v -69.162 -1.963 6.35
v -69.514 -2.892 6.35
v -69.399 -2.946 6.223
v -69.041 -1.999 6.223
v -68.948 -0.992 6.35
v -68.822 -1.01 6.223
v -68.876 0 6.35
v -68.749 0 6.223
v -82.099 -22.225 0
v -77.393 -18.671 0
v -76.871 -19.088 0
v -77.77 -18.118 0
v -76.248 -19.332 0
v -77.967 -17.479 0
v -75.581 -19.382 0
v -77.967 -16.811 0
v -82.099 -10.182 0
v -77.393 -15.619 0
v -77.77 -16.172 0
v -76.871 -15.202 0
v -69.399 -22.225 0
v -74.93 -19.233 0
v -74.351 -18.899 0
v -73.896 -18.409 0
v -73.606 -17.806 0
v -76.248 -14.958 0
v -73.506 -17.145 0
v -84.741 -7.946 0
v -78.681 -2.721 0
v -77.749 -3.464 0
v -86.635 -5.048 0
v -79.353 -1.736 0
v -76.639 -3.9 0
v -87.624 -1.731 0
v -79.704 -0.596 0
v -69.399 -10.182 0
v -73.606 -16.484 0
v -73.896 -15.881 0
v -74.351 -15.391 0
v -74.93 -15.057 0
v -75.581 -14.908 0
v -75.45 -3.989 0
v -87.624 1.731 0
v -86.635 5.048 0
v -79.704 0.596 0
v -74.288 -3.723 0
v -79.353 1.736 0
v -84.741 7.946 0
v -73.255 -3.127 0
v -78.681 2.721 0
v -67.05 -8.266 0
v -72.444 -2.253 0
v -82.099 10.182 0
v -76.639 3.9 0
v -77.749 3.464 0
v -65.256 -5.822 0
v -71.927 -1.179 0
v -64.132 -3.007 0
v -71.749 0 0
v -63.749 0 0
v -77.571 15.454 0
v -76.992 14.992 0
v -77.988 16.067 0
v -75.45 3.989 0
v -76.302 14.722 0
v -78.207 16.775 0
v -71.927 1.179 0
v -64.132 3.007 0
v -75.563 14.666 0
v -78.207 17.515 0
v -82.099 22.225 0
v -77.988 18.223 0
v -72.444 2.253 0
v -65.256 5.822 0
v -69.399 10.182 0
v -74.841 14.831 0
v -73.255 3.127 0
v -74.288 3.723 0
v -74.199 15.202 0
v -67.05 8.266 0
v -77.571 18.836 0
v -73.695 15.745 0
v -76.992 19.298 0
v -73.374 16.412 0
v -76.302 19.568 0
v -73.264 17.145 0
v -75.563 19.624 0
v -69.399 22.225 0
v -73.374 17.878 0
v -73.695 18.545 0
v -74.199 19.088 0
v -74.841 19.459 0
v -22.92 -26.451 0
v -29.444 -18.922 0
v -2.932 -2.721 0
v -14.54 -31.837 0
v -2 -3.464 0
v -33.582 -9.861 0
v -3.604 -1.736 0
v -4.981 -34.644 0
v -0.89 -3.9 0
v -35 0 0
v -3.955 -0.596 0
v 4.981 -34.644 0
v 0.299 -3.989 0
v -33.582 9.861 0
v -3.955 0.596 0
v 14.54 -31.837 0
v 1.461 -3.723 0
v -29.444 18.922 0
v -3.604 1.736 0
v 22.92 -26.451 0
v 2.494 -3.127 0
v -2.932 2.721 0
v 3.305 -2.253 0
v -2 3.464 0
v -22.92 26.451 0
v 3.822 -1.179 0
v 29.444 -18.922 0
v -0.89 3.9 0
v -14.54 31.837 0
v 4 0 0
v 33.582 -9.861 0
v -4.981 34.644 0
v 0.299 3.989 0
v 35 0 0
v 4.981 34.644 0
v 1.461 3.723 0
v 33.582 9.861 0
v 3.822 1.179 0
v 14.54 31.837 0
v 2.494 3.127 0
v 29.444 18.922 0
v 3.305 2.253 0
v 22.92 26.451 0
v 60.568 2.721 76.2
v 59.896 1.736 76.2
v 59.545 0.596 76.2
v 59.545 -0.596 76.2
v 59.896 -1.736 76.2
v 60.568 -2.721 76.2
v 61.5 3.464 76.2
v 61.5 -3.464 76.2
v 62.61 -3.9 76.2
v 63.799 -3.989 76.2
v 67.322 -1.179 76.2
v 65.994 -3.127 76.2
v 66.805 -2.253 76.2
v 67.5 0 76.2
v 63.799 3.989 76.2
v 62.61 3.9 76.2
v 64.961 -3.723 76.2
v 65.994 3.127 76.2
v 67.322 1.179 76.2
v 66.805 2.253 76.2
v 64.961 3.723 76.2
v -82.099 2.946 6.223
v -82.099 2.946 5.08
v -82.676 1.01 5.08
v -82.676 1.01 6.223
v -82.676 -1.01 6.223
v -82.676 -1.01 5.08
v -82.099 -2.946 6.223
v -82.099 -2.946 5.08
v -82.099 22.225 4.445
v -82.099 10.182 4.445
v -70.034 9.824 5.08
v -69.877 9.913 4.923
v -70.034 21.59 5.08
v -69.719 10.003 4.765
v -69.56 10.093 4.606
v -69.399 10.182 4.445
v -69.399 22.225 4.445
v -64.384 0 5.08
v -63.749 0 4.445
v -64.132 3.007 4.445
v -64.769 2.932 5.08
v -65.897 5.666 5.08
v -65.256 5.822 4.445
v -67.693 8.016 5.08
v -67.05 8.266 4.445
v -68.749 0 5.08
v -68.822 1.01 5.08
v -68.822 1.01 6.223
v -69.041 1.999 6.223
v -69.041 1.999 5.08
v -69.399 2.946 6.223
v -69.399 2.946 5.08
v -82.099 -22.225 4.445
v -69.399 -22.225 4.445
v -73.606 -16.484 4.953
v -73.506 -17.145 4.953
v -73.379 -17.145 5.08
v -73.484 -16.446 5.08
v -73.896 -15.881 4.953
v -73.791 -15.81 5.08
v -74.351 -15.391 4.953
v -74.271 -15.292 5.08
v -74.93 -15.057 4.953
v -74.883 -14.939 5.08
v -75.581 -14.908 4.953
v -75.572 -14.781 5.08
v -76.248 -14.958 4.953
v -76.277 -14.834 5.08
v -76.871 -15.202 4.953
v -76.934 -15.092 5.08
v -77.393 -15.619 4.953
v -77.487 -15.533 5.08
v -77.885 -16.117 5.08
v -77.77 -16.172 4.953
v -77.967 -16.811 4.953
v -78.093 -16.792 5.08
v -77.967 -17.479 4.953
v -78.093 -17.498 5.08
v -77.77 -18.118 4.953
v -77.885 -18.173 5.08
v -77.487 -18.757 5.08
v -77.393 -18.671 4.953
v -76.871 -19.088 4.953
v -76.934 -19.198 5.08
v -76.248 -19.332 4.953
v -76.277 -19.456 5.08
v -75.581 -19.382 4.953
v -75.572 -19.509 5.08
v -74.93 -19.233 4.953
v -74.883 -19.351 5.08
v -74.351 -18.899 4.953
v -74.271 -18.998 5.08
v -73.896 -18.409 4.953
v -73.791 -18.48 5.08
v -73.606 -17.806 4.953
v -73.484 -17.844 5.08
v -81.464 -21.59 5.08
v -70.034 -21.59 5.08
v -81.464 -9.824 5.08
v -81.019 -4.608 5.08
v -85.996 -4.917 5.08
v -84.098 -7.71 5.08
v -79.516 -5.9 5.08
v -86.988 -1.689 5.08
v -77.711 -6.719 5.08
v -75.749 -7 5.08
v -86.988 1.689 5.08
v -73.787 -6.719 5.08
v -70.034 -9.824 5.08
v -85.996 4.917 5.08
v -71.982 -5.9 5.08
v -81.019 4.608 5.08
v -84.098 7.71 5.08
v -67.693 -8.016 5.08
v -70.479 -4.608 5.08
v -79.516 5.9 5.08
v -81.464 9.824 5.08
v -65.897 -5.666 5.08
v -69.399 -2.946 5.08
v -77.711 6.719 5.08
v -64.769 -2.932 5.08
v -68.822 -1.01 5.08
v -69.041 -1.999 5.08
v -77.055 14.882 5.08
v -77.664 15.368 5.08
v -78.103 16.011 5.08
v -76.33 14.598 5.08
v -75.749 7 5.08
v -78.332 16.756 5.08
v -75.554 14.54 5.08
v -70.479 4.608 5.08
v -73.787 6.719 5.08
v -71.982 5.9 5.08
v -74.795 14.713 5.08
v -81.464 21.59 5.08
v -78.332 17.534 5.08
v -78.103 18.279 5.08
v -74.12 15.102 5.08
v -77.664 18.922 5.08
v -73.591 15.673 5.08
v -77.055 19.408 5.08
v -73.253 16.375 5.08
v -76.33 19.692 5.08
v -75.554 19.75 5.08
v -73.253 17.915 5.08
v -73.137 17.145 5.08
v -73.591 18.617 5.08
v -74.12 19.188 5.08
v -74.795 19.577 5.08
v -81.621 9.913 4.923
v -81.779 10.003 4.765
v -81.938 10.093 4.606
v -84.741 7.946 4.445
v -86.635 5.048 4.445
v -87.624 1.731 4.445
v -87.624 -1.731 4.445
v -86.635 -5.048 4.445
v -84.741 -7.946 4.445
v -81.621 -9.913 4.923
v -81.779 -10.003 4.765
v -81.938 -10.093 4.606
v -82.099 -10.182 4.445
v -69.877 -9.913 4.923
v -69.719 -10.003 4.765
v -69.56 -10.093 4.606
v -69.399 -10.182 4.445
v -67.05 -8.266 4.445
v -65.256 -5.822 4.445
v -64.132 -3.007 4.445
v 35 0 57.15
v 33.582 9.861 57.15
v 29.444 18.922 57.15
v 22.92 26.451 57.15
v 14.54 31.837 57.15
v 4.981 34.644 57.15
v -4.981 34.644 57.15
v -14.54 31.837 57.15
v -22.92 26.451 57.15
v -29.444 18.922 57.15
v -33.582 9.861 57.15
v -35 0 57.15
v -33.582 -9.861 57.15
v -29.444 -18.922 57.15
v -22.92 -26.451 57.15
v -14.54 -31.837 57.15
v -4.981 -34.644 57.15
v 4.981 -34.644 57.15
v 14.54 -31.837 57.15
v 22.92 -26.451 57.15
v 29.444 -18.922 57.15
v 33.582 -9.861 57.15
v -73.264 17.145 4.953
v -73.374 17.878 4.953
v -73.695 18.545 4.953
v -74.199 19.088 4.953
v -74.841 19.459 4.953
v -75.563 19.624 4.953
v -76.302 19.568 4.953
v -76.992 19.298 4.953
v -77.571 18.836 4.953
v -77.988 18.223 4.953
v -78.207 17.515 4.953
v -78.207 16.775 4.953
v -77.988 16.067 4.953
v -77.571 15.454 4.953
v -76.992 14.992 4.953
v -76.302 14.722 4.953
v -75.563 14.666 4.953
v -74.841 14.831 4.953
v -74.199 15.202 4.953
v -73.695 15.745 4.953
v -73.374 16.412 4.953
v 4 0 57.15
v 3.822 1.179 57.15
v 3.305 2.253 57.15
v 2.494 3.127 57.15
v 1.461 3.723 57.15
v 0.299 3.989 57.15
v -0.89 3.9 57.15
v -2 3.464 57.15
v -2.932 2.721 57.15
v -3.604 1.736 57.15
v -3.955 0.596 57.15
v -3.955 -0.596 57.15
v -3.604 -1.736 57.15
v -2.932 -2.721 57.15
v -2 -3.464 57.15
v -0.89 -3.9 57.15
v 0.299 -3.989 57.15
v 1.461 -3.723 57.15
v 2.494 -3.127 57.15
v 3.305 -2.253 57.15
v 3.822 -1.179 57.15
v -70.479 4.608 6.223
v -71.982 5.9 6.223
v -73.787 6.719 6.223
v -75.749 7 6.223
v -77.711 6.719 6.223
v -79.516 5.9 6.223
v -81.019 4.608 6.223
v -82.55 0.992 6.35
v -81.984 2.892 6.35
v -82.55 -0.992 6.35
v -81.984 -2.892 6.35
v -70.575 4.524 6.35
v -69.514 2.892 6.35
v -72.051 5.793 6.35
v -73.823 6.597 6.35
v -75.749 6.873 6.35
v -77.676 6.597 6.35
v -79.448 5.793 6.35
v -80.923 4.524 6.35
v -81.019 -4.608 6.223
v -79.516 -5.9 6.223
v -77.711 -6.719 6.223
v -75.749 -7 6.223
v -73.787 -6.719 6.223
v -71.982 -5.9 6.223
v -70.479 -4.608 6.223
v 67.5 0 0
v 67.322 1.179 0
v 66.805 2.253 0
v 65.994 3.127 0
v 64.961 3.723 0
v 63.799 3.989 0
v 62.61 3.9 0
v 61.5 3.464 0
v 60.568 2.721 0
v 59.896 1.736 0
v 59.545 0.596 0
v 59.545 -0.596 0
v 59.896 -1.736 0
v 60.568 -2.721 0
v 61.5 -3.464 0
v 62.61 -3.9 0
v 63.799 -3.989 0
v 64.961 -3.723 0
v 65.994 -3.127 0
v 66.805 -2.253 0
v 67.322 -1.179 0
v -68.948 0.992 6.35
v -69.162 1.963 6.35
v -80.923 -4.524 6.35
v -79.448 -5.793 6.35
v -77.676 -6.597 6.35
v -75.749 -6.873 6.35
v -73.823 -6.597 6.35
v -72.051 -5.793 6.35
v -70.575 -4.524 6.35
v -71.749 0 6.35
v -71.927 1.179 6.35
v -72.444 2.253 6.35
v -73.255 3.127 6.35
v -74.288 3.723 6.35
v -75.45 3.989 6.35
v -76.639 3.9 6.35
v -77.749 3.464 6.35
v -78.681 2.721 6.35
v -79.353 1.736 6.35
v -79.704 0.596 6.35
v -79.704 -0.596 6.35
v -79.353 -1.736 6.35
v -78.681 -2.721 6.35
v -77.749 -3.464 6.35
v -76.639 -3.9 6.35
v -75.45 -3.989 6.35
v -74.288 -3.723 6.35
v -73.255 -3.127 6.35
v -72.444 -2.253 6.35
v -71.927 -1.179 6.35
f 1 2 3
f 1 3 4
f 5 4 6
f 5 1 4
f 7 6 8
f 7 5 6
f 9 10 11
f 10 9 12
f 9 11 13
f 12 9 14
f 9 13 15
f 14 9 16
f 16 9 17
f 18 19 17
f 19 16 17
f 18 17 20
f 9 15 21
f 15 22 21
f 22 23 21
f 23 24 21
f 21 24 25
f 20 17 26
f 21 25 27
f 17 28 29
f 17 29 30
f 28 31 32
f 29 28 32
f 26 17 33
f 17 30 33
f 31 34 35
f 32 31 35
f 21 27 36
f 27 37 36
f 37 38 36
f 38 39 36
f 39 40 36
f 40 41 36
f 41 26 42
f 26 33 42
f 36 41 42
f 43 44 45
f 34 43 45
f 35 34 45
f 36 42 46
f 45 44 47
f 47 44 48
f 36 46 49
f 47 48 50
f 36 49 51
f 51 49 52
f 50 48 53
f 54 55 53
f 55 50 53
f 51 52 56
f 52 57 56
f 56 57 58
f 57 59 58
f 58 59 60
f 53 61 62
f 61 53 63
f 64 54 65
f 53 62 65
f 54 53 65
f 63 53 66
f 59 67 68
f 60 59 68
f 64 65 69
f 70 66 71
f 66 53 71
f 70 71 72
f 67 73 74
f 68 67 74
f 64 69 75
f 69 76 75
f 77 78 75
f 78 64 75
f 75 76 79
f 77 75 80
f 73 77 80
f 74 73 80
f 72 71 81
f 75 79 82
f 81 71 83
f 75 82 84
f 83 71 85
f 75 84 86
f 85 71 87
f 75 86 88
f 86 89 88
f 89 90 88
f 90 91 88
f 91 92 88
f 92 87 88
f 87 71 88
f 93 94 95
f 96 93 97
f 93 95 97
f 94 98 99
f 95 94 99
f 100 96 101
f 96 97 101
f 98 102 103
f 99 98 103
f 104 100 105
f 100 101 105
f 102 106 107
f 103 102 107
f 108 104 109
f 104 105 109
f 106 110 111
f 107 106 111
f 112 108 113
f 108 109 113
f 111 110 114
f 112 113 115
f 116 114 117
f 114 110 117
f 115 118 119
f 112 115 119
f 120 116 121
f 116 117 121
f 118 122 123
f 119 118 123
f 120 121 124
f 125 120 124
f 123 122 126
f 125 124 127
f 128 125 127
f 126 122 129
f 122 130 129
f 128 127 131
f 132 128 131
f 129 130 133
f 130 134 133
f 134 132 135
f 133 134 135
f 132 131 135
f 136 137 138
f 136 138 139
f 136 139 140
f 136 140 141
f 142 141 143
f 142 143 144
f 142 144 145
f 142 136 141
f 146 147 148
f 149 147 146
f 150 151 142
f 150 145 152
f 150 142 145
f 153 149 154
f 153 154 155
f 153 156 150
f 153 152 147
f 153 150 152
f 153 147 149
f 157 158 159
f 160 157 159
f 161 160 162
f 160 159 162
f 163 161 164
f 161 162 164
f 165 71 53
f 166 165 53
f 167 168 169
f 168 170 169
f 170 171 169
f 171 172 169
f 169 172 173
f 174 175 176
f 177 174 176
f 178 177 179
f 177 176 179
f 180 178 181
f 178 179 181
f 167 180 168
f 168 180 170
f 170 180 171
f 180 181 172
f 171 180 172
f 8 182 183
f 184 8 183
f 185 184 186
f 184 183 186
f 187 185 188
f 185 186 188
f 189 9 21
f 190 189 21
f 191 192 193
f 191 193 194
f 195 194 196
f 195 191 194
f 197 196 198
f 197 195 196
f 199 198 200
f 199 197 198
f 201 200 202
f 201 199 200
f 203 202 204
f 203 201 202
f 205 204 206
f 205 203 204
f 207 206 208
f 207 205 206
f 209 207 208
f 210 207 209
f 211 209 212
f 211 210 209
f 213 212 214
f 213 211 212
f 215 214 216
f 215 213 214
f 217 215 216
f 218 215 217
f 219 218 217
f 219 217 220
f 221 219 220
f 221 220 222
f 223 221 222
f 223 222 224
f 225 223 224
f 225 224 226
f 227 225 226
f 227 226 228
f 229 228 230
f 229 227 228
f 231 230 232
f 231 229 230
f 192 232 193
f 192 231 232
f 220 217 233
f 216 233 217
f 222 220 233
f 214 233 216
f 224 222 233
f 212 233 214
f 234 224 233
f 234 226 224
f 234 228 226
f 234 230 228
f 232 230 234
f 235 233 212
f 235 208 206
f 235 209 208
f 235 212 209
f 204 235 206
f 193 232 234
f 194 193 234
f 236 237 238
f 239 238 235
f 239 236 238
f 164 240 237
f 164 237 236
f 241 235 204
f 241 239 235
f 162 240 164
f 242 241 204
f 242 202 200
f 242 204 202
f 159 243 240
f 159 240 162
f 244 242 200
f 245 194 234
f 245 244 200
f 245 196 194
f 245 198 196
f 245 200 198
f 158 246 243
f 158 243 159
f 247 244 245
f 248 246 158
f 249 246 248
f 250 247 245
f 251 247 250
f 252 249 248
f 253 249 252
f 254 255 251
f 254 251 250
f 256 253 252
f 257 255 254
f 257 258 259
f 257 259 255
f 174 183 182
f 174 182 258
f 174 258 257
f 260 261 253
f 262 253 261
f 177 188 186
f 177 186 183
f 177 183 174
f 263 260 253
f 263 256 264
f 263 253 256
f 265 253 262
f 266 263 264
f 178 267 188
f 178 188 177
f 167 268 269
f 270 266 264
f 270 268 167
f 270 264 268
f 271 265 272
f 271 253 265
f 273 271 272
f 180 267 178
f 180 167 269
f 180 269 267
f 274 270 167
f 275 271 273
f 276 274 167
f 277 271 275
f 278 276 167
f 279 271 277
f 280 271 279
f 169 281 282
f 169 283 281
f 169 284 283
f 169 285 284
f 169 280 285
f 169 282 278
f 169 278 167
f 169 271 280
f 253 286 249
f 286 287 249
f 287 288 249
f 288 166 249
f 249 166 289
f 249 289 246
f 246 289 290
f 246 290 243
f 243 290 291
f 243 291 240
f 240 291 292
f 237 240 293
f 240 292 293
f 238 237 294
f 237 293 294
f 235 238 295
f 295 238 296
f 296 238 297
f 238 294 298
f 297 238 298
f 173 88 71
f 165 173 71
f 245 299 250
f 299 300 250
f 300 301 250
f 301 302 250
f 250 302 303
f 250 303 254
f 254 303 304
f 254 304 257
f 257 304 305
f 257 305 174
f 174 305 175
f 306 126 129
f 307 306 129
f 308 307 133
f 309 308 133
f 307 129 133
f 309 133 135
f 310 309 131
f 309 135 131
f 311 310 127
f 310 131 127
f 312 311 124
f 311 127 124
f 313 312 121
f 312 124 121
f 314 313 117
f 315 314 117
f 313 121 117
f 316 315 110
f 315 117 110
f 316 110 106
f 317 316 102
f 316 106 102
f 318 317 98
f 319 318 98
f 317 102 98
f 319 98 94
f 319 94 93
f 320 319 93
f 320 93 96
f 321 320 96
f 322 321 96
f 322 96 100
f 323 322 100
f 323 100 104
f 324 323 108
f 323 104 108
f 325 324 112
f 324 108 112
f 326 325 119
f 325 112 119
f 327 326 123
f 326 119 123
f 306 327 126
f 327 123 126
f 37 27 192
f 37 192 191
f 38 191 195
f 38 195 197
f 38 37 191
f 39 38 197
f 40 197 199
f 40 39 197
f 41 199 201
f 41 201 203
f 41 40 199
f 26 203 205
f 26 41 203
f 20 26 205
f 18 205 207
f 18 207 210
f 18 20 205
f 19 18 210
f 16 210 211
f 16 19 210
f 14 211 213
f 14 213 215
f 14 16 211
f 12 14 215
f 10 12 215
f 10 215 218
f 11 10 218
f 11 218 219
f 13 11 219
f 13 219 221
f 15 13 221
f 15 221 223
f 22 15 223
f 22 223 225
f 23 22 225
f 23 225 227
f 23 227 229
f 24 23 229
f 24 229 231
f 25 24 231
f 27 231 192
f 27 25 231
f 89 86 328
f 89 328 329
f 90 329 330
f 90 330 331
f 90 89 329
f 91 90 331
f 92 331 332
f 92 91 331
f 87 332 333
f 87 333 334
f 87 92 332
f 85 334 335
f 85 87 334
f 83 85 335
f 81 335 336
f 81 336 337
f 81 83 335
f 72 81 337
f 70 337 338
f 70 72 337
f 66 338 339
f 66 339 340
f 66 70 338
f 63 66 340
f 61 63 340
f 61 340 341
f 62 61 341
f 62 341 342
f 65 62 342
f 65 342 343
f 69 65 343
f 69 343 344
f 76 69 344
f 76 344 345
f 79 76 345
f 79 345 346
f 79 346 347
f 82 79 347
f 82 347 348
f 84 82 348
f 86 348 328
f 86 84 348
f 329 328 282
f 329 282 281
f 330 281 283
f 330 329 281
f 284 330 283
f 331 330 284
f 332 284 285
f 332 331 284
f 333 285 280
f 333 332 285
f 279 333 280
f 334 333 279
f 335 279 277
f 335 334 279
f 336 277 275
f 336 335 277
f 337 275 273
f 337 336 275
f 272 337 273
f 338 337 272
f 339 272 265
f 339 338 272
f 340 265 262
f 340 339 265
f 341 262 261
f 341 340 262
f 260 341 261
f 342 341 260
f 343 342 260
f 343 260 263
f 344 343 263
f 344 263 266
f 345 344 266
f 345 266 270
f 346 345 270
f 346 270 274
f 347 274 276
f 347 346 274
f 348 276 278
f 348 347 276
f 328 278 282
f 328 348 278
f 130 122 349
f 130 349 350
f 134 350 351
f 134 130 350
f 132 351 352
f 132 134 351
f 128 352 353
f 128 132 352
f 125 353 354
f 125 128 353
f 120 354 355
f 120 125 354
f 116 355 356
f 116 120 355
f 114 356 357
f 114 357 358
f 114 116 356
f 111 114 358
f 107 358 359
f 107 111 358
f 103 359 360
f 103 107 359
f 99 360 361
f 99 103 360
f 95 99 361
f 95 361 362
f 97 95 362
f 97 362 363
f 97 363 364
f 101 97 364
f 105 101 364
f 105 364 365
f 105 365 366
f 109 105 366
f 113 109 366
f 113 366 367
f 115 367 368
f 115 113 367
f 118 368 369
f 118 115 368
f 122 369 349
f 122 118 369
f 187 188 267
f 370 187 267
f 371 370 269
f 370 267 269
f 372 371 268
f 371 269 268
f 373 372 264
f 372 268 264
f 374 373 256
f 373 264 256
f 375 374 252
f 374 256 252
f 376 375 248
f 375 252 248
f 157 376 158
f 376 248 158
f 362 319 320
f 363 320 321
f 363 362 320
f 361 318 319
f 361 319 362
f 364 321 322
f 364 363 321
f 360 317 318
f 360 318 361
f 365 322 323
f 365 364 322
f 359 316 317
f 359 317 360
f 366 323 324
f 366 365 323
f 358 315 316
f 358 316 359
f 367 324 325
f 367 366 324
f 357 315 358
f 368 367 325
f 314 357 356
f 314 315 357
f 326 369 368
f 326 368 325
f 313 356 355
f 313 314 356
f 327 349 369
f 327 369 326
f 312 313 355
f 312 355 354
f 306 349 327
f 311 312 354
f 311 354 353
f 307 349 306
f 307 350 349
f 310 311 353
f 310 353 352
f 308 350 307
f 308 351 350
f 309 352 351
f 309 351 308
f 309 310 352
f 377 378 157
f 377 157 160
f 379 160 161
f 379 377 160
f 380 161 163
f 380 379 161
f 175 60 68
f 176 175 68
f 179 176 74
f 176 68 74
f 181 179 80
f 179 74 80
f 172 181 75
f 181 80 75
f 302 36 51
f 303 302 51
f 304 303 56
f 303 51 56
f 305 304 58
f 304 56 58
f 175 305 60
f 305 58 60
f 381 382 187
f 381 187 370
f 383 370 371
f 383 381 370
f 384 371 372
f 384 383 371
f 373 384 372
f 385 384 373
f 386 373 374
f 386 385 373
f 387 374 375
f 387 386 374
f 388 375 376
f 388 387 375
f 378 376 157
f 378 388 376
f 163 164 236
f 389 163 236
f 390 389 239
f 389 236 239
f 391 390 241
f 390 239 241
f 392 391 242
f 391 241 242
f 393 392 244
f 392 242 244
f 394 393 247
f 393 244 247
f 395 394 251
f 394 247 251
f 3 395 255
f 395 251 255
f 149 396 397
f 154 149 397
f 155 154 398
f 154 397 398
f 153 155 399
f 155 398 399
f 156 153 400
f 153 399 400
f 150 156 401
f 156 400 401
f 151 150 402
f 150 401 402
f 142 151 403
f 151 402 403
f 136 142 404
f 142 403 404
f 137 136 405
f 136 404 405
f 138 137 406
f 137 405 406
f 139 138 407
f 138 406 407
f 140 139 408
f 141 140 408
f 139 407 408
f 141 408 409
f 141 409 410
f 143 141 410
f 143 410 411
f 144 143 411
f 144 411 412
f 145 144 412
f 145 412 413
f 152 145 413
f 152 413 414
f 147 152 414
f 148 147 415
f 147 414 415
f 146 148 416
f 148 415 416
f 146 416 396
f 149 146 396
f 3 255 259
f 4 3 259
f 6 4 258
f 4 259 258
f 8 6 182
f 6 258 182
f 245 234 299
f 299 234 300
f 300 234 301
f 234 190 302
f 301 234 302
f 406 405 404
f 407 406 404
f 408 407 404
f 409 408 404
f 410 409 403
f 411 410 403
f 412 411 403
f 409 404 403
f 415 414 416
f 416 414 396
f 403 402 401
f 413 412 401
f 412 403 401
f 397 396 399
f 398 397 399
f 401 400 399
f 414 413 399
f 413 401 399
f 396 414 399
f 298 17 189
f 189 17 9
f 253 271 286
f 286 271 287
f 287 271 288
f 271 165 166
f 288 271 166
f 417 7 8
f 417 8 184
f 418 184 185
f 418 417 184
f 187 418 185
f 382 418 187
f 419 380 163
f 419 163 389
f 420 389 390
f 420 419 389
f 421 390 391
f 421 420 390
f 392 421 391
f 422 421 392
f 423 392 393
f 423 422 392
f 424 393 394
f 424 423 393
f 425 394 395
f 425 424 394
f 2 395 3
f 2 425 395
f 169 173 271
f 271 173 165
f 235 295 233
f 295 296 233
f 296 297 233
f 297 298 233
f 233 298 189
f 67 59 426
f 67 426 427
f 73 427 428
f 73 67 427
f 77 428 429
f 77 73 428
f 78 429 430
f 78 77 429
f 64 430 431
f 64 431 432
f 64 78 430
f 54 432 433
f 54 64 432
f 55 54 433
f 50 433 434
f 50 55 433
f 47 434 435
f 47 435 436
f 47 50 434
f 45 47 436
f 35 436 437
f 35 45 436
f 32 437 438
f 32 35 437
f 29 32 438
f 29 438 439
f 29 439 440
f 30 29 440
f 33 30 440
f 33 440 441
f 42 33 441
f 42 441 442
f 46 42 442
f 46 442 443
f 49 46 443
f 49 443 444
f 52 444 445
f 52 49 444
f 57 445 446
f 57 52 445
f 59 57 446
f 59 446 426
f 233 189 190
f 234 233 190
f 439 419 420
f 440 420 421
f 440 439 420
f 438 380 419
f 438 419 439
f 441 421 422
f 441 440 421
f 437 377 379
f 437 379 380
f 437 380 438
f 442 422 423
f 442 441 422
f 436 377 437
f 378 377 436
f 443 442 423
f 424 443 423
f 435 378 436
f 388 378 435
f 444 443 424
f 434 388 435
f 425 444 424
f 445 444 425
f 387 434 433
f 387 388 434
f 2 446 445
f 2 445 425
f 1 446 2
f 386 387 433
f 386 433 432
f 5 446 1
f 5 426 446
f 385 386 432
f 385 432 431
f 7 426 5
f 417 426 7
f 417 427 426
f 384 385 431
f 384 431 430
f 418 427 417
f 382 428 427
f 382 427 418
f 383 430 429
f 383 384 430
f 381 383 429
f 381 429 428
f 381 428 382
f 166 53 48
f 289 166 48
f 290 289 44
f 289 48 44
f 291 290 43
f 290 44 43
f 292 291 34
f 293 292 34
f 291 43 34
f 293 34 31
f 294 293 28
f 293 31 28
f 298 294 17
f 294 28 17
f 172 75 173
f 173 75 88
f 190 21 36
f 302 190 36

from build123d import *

# Parameters (mm, degrees)
F0_R     = 35
F0_R_2   = 4
F1_DEPTH = 57.15
F2_R     = 2.485524696
F2_R_2   = 2.243152178
F3_DEPTH = 5.08
F2_R_3   = 4
F4_DEPTH = 6.35
F5_SIZE  = 0.635
F6_SIZE  = 0.127
F7_DEPTH = 76.2


with BuildPart() as f1:
    # F0 (on Top) → F1 (new body)
    with BuildSketch(Plane.XY):
        Circle(F0_R)
        Circle(F0_R_2, mode=Mode.SUBTRACT)
    extrude(amount=F1_DEPTH)


with BuildPart() as f3:
    # F2 (on Top) → F3 (new body)
    with BuildSketch(Plane.XY):
        with BuildLine():
            ThreePointArc((-82.0991141558, 10.1822148868), (-75.7491141558, 12), (-69.3991141558, 10.1822148868))
            Line((-69.3991141558, 10.1822148868), (-69.3991141558, 22.225))
            Line((-69.3991141558, 22.225), (-82.0991141558, 22.225))
            Line((-82.0991141558, 22.225), (-82.0991141558, 10.1822148868))
        make_face()
        with Locations((-75.7491141558, 17.145)):
            Circle(F2_R, mode=Mode.SUBTRACT)
        with BuildLine():
            Line((-69.3991141558, -22.225), (-69.3991141558, -10.1822148868))
            ThreePointArc((-69.3991141558, -10.1822148868), (-75.7491141558, -12), (-82.0991141558, -10.1822148868))
            Line((-82.0991141558, -10.1822148868), (-82.0991141558, -22.225))
            Line((-82.0991141558, -22.225), (-69.3991141558, -22.225))
        make_face()
        with Locations((-75.7491141558, -17.145)):
            Circle(F2_R_2, mode=Mode.SUBTRACT)
        with BuildLine():
            Line((-69.3991141558, -10.1822148868), (-69.3991141558, -2.9457596643))
            ThreePointArc((-69.3991141558, -2.9457596643), (-75.7491141558, -7), (-82.0991141558, -2.9457596643))
            Line((-82.0991141558, -2.9457596643), (-82.0991141558, -10.1822148868))
            ThreePointArc((-82.0991141558, -10.1822148868), (-75.7491141558, -12), (-69.3991141558, -10.1822148868))
        make_face()
        with BuildLine():
            ThreePointArc((-82.0991141558, 2.9457596643), (-75.7491141558, 7), (-69.3991141558, 2.9457596643))
            Line((-69.3991141558, 2.9457596643), (-69.3991141558, 10.1822148868))
            ThreePointArc((-69.3991141558, 10.1822148868), (-75.7491141558, 12), (-82.0991141558, 10.1822148868))
            Line((-82.0991141558, 10.1822148868), (-82.0991141558, 2.9457596643))
        make_face()
        with BuildLine():
            ThreePointArc((-69.3991141558, 2.9457596643), (-68.9135454157, 1.5083103129), (-68.7491141558, 0))
            ThreePointArc((-68.7491141558, 0), (-68.9135454157, -1.5083103129), (-69.3991141558, -2.9457596643))
            Line((-69.3991141558, -2.9457596643), (-69.3991141558, -10.1822148868))
            ThreePointArc((-69.3991141558, -10.1822148868), (-65.2562594441, -5.8223706512), (-63.7491141558, 0))
            ThreePointArc((-63.7491141558, 0), (-65.2562594441, 5.8223706512), (-69.3991141558, 10.1822148868))
            Line((-69.3991141558, 10.1822148868), (-69.3991141558, 2.9457596643))
        make_face()
        with BuildLine():
            ThreePointArc((-82.0991141558, -2.9457596643), (-82.7491141558, 0), (-82.0991141558, 2.9457596643))
            Line((-82.0991141558, 2.9457596643), (-82.0991141558, 10.1822148868))
            ThreePointArc((-82.0991141558, 10.1822148868), (-87.7491141558, 0), (-82.0991141558, -10.1822148868))
            Line((-82.0991141558, -10.1822148868), (-82.0991141558, -2.9457596643))
        make_face()
    extrude(amount=F3_DEPTH)

    # F2 (on Top) → F4 (join)
    with BuildSketch(Plane.XY):
        with BuildLine():
            ThreePointArc((-69.3991141558, -2.9457596643), (-68.9135454157, -1.5083103129), (-68.7491141558, 0))
            ThreePointArc((-68.7491141558, 0), (-68.9135454157, 1.5083103129), (-69.3991141558, 2.9457596643))
            Line((-69.3991141558, 2.9457596643), (-69.3991141558, -2.9457596643))
        make_face()
        with BuildLine():
            Line((-69.3991141558, -2.9457596643), (-69.3991141558, 2.9457596643))
            ThreePointArc((-69.3991141558, 2.9457596643), (-75.7491141558, 7), (-82.0991141558, 2.9457596643))
            Line((-82.0991141558, 2.9457596643), (-82.0991141558, -2.9457596643))
            ThreePointArc((-82.0991141558, -2.9457596643), (-75.7491141558, -7), (-69.3991141558, -2.9457596643))
        make_face()
        with Locations((-75.7491141558, 0)):
            Circle(F2_R_3, mode=Mode.SUBTRACT)
        with BuildLine():
            Line((-82.0991141558, -2.9457596643), (-82.0991141558, 2.9457596643))
            ThreePointArc((-82.0991141558, 2.9457596643), (-82.7491141558, 0), (-82.0991141558, -2.9457596643))
        make_face()
    extrude(amount=F4_DEPTH)

    # F5
    f5_edges = [f3.edges().sort_by_distance(p)[0] for p in [
        (-87.749114, 0, 5.08),
        (-69.399114, -16.203607, 5.08),
        (-82.099114, -16.203607, 5.08),
        (-75.749114, -22.225, 5.08),
        (-63.749114, 0, 5.08),
        (-69.399114, 16.203607, 5.08),
        (-75.749114, 22.225, 5.08),
        (-82.099114, 16.203607, 5.08),
    ]]
    chamfer(f5_edges, length=F5_SIZE)

    # F6
    f6_edges = [f3.edges().sort_by_distance(p)[0] for p in [
        (-78.234639, 17.145, 5.08),
        (-77.992266, -17.145, 5.08),
        (-69.399114, -2.94576, 6.35),
    ]]
    chamfer(f6_edges, length=F6_SIZE)


with BuildPart() as f7:
    # F2 (on Top) → F7 (new body)
    with BuildSketch(Plane.XY):
        with Locations((63.5, 0)):
            Circle(F2_R_3)
    extrude(amount=F7_DEPTH)


solid = Compound([f1.part, f3.part, f7.part])
